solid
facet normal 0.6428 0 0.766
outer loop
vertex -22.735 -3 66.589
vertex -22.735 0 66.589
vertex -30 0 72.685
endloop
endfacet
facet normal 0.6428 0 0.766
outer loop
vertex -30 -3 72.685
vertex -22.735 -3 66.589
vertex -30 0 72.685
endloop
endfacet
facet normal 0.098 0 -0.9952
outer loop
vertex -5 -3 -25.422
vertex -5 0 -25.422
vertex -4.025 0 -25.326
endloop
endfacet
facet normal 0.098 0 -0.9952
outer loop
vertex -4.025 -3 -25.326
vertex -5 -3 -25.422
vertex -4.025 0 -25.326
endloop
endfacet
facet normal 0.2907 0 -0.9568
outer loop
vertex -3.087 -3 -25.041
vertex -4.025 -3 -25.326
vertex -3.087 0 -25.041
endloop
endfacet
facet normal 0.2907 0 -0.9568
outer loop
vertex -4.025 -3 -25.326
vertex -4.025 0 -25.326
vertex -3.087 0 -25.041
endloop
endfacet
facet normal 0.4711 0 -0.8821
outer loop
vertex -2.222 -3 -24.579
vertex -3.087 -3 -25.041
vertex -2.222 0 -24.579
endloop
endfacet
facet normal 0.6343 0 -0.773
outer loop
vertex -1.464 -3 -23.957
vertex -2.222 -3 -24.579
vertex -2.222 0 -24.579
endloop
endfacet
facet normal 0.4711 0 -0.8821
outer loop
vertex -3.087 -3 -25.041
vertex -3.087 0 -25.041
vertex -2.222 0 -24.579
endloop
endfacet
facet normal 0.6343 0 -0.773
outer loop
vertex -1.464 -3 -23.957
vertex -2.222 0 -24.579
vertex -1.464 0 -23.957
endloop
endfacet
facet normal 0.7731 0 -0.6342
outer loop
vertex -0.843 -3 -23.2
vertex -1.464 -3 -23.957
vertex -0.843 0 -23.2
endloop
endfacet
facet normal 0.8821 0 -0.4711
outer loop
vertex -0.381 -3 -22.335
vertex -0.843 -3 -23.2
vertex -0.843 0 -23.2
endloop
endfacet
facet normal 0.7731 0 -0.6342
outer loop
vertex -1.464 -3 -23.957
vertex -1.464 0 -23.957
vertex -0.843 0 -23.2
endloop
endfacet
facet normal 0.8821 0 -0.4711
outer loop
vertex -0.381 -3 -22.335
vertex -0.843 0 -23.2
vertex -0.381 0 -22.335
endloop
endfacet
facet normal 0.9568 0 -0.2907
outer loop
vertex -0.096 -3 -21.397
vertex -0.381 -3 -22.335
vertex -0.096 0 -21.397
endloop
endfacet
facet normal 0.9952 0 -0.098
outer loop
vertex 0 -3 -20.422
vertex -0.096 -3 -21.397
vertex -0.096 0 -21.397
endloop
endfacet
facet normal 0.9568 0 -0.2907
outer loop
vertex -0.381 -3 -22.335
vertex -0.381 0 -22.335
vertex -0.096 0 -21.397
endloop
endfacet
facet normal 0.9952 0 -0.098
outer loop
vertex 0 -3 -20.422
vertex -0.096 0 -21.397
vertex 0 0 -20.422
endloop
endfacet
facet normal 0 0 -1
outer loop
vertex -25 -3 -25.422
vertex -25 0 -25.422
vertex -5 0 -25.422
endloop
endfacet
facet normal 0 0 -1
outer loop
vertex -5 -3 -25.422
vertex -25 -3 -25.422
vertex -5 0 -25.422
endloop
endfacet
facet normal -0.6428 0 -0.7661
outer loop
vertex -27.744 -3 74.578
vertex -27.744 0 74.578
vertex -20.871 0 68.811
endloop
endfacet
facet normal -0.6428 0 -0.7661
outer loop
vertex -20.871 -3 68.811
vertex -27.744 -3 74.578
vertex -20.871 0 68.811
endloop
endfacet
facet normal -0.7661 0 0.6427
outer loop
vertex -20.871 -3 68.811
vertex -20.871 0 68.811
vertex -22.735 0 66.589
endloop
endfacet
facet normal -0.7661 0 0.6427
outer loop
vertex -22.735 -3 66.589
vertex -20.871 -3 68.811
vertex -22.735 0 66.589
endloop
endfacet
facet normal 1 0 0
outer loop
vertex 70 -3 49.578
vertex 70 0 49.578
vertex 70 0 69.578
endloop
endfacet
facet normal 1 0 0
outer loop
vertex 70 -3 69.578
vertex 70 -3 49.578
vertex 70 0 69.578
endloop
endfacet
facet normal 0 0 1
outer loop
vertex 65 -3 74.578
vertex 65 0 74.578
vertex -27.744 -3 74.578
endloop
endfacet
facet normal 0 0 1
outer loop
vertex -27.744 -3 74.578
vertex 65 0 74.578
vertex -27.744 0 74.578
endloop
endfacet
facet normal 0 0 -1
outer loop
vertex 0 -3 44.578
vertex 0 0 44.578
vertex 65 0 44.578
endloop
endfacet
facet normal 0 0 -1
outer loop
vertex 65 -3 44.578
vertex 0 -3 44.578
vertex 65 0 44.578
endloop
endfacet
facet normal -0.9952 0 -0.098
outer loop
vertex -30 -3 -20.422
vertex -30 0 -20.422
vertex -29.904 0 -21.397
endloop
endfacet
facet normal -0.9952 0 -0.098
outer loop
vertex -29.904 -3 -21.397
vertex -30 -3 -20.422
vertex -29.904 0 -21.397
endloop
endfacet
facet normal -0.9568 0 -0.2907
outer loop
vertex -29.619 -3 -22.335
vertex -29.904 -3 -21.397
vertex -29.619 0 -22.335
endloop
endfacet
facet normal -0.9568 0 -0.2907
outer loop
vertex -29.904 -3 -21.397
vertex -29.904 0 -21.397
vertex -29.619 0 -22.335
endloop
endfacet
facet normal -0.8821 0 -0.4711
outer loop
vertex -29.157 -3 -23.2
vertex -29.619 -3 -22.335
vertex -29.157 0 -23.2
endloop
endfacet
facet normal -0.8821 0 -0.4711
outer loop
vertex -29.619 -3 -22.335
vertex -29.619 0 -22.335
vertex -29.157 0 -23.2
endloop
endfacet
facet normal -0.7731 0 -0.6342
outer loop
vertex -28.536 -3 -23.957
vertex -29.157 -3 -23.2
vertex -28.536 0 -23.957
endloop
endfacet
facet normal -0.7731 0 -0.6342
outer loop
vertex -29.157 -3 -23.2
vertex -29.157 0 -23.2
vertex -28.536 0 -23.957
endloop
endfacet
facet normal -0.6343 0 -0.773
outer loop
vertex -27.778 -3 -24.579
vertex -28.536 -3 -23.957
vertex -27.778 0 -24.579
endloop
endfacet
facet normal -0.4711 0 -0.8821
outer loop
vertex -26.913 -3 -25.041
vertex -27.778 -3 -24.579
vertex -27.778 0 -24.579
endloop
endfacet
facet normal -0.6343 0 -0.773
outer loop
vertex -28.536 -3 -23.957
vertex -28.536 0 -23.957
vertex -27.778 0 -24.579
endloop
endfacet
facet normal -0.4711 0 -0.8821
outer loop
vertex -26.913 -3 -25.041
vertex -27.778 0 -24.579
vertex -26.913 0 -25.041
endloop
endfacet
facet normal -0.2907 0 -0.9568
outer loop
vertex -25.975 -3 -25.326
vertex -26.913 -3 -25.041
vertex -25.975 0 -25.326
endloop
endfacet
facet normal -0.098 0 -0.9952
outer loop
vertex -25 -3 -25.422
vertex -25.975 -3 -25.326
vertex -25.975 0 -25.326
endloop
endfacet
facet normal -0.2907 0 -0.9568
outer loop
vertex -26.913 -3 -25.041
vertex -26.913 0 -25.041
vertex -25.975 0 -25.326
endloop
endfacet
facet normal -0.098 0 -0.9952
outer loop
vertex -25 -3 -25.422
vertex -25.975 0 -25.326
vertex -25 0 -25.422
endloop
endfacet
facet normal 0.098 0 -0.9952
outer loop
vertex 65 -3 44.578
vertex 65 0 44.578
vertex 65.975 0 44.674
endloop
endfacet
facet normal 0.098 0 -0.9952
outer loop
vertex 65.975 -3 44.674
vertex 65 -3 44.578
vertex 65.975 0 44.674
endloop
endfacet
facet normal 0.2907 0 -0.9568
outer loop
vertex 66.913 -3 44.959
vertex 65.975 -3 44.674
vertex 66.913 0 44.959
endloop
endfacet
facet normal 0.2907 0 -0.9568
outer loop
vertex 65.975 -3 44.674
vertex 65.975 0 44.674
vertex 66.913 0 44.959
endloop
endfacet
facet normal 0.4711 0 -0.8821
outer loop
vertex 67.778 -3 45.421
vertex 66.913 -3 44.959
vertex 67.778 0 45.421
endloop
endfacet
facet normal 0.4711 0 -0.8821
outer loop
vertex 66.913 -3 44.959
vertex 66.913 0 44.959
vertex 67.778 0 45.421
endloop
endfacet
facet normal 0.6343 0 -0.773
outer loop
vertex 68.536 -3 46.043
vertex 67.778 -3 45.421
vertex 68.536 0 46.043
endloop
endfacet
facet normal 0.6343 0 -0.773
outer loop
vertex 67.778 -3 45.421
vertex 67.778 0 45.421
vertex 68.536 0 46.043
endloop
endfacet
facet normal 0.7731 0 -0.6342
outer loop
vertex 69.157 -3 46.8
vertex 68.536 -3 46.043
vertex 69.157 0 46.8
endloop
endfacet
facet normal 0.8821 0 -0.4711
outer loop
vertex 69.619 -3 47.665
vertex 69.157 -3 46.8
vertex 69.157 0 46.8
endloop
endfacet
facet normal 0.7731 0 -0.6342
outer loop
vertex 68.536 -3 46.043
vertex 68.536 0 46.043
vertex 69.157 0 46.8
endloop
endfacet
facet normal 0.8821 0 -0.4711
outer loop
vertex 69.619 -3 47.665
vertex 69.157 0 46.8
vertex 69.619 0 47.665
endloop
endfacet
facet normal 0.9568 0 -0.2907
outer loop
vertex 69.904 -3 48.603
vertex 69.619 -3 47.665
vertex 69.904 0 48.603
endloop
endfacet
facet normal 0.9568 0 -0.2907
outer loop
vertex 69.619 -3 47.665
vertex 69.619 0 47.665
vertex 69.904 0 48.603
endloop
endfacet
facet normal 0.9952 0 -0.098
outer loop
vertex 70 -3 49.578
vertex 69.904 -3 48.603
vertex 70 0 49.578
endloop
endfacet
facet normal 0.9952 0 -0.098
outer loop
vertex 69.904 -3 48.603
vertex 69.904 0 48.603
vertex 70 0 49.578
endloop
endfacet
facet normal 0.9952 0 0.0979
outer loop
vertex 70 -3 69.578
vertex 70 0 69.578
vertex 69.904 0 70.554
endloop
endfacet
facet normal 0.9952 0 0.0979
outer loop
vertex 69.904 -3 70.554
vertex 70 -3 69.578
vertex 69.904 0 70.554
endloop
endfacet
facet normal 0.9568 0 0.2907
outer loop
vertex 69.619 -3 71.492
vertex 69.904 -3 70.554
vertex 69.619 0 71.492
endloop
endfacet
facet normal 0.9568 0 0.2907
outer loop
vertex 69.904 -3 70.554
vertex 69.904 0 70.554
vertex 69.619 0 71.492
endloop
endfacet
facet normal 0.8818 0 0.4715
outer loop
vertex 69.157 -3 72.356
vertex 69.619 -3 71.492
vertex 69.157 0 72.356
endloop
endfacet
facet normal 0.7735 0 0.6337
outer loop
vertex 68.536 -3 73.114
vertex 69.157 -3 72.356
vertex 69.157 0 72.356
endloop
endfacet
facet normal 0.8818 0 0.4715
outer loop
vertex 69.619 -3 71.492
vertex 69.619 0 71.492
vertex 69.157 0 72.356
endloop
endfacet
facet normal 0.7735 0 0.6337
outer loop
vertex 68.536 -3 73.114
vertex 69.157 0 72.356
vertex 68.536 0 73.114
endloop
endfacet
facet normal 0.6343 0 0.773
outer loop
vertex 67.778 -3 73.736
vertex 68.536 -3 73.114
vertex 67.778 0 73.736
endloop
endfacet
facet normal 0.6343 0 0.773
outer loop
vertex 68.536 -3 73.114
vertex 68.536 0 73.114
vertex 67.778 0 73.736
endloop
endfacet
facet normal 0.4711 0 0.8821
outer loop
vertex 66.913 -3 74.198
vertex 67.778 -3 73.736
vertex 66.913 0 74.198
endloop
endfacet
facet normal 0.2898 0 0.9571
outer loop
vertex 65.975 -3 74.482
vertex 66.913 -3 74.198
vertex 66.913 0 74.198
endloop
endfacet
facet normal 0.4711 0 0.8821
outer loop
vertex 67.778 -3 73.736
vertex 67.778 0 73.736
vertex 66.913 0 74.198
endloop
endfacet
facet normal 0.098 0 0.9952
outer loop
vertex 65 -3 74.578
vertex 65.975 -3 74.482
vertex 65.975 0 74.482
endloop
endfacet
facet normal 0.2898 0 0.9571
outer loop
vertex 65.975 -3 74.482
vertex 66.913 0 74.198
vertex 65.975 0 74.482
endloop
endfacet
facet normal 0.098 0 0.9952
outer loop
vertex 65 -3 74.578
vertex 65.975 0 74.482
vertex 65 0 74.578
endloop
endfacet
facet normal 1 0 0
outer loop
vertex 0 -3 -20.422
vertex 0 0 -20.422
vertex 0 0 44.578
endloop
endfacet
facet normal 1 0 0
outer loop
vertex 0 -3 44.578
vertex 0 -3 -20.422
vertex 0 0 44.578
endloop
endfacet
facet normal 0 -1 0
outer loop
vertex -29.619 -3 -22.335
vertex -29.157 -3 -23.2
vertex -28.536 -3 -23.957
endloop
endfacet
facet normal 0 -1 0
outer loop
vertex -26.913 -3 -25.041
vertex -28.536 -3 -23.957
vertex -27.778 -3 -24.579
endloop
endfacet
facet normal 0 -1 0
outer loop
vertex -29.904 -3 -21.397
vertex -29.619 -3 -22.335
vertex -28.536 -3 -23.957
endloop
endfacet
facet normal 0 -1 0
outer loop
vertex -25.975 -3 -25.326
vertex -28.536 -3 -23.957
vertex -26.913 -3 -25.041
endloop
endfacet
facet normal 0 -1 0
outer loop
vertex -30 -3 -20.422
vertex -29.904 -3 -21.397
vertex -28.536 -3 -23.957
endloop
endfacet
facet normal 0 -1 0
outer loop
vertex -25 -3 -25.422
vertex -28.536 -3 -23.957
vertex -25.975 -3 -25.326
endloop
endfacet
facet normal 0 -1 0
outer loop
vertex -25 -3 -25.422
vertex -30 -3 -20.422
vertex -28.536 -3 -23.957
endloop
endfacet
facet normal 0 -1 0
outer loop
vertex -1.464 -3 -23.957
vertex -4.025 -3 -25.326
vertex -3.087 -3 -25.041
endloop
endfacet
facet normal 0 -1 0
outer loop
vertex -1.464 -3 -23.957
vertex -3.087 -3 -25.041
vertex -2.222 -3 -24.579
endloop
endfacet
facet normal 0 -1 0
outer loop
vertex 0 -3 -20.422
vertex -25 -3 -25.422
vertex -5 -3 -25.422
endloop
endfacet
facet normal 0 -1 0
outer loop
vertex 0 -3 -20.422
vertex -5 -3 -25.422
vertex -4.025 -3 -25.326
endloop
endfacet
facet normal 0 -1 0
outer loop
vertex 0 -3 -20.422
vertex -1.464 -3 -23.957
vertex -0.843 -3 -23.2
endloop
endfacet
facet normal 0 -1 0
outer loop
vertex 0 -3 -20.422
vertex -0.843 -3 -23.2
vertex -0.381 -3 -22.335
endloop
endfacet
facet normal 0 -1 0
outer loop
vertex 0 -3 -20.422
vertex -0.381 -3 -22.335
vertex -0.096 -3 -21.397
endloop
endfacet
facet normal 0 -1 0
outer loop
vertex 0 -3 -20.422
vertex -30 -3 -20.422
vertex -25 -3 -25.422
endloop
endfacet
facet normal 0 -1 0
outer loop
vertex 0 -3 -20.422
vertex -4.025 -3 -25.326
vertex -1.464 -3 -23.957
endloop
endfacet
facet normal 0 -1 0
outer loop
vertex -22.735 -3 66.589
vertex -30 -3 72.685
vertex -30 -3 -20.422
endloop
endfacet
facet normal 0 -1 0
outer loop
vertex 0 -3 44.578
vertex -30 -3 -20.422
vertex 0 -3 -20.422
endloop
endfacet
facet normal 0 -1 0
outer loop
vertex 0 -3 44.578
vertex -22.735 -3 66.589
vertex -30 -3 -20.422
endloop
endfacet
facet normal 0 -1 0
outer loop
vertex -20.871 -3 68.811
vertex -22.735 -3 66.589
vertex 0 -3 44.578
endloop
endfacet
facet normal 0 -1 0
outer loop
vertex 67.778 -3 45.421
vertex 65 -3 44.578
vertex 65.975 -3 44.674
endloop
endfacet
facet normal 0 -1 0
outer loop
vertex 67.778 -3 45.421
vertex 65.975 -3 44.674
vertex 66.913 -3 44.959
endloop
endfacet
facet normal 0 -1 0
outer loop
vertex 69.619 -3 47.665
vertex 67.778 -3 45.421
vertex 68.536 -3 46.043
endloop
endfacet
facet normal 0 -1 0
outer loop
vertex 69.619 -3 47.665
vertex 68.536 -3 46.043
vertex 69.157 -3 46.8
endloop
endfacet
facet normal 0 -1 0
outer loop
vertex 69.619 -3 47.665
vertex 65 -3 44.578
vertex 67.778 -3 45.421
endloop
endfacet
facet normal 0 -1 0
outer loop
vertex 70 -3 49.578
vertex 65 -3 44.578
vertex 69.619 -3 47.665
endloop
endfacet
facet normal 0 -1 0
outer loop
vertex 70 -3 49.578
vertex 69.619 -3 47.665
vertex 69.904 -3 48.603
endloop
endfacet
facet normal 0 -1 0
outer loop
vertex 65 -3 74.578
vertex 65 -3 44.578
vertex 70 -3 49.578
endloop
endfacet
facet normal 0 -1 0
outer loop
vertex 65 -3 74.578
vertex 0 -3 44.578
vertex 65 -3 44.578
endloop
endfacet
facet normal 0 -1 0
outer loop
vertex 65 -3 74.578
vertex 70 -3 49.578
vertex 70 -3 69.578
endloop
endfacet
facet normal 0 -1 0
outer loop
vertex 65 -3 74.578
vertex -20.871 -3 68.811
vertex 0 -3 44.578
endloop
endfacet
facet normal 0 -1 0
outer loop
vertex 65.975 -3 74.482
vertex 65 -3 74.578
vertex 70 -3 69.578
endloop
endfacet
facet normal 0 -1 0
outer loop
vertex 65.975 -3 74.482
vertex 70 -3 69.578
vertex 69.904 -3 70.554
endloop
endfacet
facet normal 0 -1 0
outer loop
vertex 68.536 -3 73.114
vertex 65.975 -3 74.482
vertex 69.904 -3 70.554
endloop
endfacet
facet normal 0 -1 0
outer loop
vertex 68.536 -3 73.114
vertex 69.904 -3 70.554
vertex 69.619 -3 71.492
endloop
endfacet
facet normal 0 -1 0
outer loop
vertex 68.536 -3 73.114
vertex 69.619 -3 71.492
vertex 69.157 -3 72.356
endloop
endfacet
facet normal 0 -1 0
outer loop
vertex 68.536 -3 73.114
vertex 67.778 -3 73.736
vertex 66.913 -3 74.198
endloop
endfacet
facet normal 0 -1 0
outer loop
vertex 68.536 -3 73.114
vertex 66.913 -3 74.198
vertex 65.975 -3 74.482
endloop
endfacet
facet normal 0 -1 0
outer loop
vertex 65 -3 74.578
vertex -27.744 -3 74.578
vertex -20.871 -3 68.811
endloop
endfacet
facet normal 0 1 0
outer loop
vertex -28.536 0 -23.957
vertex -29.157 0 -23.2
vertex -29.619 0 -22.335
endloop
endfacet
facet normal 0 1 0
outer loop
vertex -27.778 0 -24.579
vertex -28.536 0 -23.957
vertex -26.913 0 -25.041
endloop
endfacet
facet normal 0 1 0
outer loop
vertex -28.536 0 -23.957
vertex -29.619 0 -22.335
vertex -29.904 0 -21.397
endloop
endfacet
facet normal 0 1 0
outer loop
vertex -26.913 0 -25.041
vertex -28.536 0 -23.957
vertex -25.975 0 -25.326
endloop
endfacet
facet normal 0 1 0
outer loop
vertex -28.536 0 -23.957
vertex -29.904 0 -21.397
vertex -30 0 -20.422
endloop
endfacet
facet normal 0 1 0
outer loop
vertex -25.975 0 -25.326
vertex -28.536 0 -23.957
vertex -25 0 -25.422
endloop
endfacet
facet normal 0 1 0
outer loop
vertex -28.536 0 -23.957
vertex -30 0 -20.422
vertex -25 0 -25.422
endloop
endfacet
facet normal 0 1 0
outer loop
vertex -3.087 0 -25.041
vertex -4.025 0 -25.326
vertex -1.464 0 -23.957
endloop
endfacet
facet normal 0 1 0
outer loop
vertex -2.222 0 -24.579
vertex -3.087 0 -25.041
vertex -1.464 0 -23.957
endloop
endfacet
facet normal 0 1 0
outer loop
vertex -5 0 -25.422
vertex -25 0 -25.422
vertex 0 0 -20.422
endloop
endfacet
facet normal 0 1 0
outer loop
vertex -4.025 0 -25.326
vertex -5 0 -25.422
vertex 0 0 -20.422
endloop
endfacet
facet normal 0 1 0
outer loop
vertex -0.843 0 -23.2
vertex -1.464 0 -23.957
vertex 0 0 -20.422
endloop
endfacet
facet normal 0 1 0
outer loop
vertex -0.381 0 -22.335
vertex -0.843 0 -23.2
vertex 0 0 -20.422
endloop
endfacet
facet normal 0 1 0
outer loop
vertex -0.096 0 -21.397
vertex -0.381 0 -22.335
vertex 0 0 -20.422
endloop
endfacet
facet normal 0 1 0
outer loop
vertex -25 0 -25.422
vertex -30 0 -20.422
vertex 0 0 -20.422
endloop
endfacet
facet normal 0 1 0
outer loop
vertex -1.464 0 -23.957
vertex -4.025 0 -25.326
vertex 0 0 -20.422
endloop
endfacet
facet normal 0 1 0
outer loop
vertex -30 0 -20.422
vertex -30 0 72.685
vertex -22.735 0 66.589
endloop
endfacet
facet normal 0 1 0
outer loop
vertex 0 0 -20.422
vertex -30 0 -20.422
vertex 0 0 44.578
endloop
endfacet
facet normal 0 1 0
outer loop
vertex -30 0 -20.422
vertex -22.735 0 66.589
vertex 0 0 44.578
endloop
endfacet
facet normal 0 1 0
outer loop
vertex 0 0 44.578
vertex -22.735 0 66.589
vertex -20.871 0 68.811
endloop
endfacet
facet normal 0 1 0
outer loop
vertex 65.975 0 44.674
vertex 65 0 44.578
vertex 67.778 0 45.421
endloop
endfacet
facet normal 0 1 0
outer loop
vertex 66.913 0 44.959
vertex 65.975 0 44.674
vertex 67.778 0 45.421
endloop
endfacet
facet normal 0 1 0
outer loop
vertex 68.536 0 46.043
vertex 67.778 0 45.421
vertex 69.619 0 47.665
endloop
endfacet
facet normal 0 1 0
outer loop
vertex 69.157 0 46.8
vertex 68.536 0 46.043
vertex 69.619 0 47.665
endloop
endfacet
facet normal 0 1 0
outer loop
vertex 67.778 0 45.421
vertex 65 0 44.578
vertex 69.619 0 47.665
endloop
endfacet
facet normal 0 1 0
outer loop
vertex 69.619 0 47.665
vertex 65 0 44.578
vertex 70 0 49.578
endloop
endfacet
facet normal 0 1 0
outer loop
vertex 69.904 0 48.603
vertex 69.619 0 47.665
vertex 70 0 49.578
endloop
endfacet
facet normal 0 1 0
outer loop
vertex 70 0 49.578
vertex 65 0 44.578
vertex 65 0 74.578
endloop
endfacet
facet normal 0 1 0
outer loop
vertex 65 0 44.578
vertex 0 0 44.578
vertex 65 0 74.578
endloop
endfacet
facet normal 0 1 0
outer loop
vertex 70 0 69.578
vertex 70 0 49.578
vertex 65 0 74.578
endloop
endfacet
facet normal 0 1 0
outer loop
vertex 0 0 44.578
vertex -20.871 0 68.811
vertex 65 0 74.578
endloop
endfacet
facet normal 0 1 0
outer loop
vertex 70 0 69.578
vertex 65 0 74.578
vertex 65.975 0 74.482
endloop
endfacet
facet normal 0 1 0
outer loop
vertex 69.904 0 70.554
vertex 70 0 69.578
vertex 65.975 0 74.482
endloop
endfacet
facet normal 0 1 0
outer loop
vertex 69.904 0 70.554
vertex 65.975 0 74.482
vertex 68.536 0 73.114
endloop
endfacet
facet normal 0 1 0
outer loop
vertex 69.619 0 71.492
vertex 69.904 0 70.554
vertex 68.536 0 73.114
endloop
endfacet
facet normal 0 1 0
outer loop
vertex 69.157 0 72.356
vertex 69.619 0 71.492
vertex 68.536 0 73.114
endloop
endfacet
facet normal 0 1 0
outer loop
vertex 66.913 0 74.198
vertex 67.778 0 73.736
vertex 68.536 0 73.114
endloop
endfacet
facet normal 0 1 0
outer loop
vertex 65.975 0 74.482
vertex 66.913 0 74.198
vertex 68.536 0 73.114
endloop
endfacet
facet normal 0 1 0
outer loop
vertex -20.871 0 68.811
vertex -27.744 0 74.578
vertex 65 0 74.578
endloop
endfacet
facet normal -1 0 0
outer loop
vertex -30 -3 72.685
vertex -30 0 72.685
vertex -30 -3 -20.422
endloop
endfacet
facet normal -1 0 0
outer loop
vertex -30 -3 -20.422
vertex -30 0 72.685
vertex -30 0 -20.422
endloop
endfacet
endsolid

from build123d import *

# Parameters (mm, degrees)
F1_DEPTH = 3


with BuildPart() as f1:
    # F0 (on Front) → F1 (new body)
    with BuildSketch(Plane.XZ):
        with BuildLine():
            Line((65, 74.578316), (0, 74.578316))
            Line((0, 74.578316), (-27.7442, 74.578316))
            Line((-27.7442, 74.578316), (-20.87088, 68.810916))
            Line((-20.87088, 68.810916), (-22.734964, 66.589387))
            Line((-22.734964, 66.589387), (-30, 72.685476))
            Line((-30, 72.685476), (-30, 44.578316))
            Line((-30, 44.578316), (-30, -20.421684))
            ThreePointArc((-30, -20.421684), (-28.535534, -23.957218), (-25, -25.421684))
            Line((-25, -25.421684), (-5, -25.421684))
            ThreePointArc((-5, -25.421684), (-1.464466, -23.957218), (0, -20.421684))
            Line((0, -20.421684), (0, 44.578316))
            Line((0, 44.578316), (65, 44.578316))
            ThreePointArc((65, 44.578316), (68.535534, 46.042782), (70, 49.578316))
            Line((70, 49.578316), (70, 69.578316))
            ThreePointArc((70, 69.578316), (68.535534, 73.11385), (65, 74.578316))
        make_face()
    extrude(amount=F1_DEPTH)


solid = f1.part
